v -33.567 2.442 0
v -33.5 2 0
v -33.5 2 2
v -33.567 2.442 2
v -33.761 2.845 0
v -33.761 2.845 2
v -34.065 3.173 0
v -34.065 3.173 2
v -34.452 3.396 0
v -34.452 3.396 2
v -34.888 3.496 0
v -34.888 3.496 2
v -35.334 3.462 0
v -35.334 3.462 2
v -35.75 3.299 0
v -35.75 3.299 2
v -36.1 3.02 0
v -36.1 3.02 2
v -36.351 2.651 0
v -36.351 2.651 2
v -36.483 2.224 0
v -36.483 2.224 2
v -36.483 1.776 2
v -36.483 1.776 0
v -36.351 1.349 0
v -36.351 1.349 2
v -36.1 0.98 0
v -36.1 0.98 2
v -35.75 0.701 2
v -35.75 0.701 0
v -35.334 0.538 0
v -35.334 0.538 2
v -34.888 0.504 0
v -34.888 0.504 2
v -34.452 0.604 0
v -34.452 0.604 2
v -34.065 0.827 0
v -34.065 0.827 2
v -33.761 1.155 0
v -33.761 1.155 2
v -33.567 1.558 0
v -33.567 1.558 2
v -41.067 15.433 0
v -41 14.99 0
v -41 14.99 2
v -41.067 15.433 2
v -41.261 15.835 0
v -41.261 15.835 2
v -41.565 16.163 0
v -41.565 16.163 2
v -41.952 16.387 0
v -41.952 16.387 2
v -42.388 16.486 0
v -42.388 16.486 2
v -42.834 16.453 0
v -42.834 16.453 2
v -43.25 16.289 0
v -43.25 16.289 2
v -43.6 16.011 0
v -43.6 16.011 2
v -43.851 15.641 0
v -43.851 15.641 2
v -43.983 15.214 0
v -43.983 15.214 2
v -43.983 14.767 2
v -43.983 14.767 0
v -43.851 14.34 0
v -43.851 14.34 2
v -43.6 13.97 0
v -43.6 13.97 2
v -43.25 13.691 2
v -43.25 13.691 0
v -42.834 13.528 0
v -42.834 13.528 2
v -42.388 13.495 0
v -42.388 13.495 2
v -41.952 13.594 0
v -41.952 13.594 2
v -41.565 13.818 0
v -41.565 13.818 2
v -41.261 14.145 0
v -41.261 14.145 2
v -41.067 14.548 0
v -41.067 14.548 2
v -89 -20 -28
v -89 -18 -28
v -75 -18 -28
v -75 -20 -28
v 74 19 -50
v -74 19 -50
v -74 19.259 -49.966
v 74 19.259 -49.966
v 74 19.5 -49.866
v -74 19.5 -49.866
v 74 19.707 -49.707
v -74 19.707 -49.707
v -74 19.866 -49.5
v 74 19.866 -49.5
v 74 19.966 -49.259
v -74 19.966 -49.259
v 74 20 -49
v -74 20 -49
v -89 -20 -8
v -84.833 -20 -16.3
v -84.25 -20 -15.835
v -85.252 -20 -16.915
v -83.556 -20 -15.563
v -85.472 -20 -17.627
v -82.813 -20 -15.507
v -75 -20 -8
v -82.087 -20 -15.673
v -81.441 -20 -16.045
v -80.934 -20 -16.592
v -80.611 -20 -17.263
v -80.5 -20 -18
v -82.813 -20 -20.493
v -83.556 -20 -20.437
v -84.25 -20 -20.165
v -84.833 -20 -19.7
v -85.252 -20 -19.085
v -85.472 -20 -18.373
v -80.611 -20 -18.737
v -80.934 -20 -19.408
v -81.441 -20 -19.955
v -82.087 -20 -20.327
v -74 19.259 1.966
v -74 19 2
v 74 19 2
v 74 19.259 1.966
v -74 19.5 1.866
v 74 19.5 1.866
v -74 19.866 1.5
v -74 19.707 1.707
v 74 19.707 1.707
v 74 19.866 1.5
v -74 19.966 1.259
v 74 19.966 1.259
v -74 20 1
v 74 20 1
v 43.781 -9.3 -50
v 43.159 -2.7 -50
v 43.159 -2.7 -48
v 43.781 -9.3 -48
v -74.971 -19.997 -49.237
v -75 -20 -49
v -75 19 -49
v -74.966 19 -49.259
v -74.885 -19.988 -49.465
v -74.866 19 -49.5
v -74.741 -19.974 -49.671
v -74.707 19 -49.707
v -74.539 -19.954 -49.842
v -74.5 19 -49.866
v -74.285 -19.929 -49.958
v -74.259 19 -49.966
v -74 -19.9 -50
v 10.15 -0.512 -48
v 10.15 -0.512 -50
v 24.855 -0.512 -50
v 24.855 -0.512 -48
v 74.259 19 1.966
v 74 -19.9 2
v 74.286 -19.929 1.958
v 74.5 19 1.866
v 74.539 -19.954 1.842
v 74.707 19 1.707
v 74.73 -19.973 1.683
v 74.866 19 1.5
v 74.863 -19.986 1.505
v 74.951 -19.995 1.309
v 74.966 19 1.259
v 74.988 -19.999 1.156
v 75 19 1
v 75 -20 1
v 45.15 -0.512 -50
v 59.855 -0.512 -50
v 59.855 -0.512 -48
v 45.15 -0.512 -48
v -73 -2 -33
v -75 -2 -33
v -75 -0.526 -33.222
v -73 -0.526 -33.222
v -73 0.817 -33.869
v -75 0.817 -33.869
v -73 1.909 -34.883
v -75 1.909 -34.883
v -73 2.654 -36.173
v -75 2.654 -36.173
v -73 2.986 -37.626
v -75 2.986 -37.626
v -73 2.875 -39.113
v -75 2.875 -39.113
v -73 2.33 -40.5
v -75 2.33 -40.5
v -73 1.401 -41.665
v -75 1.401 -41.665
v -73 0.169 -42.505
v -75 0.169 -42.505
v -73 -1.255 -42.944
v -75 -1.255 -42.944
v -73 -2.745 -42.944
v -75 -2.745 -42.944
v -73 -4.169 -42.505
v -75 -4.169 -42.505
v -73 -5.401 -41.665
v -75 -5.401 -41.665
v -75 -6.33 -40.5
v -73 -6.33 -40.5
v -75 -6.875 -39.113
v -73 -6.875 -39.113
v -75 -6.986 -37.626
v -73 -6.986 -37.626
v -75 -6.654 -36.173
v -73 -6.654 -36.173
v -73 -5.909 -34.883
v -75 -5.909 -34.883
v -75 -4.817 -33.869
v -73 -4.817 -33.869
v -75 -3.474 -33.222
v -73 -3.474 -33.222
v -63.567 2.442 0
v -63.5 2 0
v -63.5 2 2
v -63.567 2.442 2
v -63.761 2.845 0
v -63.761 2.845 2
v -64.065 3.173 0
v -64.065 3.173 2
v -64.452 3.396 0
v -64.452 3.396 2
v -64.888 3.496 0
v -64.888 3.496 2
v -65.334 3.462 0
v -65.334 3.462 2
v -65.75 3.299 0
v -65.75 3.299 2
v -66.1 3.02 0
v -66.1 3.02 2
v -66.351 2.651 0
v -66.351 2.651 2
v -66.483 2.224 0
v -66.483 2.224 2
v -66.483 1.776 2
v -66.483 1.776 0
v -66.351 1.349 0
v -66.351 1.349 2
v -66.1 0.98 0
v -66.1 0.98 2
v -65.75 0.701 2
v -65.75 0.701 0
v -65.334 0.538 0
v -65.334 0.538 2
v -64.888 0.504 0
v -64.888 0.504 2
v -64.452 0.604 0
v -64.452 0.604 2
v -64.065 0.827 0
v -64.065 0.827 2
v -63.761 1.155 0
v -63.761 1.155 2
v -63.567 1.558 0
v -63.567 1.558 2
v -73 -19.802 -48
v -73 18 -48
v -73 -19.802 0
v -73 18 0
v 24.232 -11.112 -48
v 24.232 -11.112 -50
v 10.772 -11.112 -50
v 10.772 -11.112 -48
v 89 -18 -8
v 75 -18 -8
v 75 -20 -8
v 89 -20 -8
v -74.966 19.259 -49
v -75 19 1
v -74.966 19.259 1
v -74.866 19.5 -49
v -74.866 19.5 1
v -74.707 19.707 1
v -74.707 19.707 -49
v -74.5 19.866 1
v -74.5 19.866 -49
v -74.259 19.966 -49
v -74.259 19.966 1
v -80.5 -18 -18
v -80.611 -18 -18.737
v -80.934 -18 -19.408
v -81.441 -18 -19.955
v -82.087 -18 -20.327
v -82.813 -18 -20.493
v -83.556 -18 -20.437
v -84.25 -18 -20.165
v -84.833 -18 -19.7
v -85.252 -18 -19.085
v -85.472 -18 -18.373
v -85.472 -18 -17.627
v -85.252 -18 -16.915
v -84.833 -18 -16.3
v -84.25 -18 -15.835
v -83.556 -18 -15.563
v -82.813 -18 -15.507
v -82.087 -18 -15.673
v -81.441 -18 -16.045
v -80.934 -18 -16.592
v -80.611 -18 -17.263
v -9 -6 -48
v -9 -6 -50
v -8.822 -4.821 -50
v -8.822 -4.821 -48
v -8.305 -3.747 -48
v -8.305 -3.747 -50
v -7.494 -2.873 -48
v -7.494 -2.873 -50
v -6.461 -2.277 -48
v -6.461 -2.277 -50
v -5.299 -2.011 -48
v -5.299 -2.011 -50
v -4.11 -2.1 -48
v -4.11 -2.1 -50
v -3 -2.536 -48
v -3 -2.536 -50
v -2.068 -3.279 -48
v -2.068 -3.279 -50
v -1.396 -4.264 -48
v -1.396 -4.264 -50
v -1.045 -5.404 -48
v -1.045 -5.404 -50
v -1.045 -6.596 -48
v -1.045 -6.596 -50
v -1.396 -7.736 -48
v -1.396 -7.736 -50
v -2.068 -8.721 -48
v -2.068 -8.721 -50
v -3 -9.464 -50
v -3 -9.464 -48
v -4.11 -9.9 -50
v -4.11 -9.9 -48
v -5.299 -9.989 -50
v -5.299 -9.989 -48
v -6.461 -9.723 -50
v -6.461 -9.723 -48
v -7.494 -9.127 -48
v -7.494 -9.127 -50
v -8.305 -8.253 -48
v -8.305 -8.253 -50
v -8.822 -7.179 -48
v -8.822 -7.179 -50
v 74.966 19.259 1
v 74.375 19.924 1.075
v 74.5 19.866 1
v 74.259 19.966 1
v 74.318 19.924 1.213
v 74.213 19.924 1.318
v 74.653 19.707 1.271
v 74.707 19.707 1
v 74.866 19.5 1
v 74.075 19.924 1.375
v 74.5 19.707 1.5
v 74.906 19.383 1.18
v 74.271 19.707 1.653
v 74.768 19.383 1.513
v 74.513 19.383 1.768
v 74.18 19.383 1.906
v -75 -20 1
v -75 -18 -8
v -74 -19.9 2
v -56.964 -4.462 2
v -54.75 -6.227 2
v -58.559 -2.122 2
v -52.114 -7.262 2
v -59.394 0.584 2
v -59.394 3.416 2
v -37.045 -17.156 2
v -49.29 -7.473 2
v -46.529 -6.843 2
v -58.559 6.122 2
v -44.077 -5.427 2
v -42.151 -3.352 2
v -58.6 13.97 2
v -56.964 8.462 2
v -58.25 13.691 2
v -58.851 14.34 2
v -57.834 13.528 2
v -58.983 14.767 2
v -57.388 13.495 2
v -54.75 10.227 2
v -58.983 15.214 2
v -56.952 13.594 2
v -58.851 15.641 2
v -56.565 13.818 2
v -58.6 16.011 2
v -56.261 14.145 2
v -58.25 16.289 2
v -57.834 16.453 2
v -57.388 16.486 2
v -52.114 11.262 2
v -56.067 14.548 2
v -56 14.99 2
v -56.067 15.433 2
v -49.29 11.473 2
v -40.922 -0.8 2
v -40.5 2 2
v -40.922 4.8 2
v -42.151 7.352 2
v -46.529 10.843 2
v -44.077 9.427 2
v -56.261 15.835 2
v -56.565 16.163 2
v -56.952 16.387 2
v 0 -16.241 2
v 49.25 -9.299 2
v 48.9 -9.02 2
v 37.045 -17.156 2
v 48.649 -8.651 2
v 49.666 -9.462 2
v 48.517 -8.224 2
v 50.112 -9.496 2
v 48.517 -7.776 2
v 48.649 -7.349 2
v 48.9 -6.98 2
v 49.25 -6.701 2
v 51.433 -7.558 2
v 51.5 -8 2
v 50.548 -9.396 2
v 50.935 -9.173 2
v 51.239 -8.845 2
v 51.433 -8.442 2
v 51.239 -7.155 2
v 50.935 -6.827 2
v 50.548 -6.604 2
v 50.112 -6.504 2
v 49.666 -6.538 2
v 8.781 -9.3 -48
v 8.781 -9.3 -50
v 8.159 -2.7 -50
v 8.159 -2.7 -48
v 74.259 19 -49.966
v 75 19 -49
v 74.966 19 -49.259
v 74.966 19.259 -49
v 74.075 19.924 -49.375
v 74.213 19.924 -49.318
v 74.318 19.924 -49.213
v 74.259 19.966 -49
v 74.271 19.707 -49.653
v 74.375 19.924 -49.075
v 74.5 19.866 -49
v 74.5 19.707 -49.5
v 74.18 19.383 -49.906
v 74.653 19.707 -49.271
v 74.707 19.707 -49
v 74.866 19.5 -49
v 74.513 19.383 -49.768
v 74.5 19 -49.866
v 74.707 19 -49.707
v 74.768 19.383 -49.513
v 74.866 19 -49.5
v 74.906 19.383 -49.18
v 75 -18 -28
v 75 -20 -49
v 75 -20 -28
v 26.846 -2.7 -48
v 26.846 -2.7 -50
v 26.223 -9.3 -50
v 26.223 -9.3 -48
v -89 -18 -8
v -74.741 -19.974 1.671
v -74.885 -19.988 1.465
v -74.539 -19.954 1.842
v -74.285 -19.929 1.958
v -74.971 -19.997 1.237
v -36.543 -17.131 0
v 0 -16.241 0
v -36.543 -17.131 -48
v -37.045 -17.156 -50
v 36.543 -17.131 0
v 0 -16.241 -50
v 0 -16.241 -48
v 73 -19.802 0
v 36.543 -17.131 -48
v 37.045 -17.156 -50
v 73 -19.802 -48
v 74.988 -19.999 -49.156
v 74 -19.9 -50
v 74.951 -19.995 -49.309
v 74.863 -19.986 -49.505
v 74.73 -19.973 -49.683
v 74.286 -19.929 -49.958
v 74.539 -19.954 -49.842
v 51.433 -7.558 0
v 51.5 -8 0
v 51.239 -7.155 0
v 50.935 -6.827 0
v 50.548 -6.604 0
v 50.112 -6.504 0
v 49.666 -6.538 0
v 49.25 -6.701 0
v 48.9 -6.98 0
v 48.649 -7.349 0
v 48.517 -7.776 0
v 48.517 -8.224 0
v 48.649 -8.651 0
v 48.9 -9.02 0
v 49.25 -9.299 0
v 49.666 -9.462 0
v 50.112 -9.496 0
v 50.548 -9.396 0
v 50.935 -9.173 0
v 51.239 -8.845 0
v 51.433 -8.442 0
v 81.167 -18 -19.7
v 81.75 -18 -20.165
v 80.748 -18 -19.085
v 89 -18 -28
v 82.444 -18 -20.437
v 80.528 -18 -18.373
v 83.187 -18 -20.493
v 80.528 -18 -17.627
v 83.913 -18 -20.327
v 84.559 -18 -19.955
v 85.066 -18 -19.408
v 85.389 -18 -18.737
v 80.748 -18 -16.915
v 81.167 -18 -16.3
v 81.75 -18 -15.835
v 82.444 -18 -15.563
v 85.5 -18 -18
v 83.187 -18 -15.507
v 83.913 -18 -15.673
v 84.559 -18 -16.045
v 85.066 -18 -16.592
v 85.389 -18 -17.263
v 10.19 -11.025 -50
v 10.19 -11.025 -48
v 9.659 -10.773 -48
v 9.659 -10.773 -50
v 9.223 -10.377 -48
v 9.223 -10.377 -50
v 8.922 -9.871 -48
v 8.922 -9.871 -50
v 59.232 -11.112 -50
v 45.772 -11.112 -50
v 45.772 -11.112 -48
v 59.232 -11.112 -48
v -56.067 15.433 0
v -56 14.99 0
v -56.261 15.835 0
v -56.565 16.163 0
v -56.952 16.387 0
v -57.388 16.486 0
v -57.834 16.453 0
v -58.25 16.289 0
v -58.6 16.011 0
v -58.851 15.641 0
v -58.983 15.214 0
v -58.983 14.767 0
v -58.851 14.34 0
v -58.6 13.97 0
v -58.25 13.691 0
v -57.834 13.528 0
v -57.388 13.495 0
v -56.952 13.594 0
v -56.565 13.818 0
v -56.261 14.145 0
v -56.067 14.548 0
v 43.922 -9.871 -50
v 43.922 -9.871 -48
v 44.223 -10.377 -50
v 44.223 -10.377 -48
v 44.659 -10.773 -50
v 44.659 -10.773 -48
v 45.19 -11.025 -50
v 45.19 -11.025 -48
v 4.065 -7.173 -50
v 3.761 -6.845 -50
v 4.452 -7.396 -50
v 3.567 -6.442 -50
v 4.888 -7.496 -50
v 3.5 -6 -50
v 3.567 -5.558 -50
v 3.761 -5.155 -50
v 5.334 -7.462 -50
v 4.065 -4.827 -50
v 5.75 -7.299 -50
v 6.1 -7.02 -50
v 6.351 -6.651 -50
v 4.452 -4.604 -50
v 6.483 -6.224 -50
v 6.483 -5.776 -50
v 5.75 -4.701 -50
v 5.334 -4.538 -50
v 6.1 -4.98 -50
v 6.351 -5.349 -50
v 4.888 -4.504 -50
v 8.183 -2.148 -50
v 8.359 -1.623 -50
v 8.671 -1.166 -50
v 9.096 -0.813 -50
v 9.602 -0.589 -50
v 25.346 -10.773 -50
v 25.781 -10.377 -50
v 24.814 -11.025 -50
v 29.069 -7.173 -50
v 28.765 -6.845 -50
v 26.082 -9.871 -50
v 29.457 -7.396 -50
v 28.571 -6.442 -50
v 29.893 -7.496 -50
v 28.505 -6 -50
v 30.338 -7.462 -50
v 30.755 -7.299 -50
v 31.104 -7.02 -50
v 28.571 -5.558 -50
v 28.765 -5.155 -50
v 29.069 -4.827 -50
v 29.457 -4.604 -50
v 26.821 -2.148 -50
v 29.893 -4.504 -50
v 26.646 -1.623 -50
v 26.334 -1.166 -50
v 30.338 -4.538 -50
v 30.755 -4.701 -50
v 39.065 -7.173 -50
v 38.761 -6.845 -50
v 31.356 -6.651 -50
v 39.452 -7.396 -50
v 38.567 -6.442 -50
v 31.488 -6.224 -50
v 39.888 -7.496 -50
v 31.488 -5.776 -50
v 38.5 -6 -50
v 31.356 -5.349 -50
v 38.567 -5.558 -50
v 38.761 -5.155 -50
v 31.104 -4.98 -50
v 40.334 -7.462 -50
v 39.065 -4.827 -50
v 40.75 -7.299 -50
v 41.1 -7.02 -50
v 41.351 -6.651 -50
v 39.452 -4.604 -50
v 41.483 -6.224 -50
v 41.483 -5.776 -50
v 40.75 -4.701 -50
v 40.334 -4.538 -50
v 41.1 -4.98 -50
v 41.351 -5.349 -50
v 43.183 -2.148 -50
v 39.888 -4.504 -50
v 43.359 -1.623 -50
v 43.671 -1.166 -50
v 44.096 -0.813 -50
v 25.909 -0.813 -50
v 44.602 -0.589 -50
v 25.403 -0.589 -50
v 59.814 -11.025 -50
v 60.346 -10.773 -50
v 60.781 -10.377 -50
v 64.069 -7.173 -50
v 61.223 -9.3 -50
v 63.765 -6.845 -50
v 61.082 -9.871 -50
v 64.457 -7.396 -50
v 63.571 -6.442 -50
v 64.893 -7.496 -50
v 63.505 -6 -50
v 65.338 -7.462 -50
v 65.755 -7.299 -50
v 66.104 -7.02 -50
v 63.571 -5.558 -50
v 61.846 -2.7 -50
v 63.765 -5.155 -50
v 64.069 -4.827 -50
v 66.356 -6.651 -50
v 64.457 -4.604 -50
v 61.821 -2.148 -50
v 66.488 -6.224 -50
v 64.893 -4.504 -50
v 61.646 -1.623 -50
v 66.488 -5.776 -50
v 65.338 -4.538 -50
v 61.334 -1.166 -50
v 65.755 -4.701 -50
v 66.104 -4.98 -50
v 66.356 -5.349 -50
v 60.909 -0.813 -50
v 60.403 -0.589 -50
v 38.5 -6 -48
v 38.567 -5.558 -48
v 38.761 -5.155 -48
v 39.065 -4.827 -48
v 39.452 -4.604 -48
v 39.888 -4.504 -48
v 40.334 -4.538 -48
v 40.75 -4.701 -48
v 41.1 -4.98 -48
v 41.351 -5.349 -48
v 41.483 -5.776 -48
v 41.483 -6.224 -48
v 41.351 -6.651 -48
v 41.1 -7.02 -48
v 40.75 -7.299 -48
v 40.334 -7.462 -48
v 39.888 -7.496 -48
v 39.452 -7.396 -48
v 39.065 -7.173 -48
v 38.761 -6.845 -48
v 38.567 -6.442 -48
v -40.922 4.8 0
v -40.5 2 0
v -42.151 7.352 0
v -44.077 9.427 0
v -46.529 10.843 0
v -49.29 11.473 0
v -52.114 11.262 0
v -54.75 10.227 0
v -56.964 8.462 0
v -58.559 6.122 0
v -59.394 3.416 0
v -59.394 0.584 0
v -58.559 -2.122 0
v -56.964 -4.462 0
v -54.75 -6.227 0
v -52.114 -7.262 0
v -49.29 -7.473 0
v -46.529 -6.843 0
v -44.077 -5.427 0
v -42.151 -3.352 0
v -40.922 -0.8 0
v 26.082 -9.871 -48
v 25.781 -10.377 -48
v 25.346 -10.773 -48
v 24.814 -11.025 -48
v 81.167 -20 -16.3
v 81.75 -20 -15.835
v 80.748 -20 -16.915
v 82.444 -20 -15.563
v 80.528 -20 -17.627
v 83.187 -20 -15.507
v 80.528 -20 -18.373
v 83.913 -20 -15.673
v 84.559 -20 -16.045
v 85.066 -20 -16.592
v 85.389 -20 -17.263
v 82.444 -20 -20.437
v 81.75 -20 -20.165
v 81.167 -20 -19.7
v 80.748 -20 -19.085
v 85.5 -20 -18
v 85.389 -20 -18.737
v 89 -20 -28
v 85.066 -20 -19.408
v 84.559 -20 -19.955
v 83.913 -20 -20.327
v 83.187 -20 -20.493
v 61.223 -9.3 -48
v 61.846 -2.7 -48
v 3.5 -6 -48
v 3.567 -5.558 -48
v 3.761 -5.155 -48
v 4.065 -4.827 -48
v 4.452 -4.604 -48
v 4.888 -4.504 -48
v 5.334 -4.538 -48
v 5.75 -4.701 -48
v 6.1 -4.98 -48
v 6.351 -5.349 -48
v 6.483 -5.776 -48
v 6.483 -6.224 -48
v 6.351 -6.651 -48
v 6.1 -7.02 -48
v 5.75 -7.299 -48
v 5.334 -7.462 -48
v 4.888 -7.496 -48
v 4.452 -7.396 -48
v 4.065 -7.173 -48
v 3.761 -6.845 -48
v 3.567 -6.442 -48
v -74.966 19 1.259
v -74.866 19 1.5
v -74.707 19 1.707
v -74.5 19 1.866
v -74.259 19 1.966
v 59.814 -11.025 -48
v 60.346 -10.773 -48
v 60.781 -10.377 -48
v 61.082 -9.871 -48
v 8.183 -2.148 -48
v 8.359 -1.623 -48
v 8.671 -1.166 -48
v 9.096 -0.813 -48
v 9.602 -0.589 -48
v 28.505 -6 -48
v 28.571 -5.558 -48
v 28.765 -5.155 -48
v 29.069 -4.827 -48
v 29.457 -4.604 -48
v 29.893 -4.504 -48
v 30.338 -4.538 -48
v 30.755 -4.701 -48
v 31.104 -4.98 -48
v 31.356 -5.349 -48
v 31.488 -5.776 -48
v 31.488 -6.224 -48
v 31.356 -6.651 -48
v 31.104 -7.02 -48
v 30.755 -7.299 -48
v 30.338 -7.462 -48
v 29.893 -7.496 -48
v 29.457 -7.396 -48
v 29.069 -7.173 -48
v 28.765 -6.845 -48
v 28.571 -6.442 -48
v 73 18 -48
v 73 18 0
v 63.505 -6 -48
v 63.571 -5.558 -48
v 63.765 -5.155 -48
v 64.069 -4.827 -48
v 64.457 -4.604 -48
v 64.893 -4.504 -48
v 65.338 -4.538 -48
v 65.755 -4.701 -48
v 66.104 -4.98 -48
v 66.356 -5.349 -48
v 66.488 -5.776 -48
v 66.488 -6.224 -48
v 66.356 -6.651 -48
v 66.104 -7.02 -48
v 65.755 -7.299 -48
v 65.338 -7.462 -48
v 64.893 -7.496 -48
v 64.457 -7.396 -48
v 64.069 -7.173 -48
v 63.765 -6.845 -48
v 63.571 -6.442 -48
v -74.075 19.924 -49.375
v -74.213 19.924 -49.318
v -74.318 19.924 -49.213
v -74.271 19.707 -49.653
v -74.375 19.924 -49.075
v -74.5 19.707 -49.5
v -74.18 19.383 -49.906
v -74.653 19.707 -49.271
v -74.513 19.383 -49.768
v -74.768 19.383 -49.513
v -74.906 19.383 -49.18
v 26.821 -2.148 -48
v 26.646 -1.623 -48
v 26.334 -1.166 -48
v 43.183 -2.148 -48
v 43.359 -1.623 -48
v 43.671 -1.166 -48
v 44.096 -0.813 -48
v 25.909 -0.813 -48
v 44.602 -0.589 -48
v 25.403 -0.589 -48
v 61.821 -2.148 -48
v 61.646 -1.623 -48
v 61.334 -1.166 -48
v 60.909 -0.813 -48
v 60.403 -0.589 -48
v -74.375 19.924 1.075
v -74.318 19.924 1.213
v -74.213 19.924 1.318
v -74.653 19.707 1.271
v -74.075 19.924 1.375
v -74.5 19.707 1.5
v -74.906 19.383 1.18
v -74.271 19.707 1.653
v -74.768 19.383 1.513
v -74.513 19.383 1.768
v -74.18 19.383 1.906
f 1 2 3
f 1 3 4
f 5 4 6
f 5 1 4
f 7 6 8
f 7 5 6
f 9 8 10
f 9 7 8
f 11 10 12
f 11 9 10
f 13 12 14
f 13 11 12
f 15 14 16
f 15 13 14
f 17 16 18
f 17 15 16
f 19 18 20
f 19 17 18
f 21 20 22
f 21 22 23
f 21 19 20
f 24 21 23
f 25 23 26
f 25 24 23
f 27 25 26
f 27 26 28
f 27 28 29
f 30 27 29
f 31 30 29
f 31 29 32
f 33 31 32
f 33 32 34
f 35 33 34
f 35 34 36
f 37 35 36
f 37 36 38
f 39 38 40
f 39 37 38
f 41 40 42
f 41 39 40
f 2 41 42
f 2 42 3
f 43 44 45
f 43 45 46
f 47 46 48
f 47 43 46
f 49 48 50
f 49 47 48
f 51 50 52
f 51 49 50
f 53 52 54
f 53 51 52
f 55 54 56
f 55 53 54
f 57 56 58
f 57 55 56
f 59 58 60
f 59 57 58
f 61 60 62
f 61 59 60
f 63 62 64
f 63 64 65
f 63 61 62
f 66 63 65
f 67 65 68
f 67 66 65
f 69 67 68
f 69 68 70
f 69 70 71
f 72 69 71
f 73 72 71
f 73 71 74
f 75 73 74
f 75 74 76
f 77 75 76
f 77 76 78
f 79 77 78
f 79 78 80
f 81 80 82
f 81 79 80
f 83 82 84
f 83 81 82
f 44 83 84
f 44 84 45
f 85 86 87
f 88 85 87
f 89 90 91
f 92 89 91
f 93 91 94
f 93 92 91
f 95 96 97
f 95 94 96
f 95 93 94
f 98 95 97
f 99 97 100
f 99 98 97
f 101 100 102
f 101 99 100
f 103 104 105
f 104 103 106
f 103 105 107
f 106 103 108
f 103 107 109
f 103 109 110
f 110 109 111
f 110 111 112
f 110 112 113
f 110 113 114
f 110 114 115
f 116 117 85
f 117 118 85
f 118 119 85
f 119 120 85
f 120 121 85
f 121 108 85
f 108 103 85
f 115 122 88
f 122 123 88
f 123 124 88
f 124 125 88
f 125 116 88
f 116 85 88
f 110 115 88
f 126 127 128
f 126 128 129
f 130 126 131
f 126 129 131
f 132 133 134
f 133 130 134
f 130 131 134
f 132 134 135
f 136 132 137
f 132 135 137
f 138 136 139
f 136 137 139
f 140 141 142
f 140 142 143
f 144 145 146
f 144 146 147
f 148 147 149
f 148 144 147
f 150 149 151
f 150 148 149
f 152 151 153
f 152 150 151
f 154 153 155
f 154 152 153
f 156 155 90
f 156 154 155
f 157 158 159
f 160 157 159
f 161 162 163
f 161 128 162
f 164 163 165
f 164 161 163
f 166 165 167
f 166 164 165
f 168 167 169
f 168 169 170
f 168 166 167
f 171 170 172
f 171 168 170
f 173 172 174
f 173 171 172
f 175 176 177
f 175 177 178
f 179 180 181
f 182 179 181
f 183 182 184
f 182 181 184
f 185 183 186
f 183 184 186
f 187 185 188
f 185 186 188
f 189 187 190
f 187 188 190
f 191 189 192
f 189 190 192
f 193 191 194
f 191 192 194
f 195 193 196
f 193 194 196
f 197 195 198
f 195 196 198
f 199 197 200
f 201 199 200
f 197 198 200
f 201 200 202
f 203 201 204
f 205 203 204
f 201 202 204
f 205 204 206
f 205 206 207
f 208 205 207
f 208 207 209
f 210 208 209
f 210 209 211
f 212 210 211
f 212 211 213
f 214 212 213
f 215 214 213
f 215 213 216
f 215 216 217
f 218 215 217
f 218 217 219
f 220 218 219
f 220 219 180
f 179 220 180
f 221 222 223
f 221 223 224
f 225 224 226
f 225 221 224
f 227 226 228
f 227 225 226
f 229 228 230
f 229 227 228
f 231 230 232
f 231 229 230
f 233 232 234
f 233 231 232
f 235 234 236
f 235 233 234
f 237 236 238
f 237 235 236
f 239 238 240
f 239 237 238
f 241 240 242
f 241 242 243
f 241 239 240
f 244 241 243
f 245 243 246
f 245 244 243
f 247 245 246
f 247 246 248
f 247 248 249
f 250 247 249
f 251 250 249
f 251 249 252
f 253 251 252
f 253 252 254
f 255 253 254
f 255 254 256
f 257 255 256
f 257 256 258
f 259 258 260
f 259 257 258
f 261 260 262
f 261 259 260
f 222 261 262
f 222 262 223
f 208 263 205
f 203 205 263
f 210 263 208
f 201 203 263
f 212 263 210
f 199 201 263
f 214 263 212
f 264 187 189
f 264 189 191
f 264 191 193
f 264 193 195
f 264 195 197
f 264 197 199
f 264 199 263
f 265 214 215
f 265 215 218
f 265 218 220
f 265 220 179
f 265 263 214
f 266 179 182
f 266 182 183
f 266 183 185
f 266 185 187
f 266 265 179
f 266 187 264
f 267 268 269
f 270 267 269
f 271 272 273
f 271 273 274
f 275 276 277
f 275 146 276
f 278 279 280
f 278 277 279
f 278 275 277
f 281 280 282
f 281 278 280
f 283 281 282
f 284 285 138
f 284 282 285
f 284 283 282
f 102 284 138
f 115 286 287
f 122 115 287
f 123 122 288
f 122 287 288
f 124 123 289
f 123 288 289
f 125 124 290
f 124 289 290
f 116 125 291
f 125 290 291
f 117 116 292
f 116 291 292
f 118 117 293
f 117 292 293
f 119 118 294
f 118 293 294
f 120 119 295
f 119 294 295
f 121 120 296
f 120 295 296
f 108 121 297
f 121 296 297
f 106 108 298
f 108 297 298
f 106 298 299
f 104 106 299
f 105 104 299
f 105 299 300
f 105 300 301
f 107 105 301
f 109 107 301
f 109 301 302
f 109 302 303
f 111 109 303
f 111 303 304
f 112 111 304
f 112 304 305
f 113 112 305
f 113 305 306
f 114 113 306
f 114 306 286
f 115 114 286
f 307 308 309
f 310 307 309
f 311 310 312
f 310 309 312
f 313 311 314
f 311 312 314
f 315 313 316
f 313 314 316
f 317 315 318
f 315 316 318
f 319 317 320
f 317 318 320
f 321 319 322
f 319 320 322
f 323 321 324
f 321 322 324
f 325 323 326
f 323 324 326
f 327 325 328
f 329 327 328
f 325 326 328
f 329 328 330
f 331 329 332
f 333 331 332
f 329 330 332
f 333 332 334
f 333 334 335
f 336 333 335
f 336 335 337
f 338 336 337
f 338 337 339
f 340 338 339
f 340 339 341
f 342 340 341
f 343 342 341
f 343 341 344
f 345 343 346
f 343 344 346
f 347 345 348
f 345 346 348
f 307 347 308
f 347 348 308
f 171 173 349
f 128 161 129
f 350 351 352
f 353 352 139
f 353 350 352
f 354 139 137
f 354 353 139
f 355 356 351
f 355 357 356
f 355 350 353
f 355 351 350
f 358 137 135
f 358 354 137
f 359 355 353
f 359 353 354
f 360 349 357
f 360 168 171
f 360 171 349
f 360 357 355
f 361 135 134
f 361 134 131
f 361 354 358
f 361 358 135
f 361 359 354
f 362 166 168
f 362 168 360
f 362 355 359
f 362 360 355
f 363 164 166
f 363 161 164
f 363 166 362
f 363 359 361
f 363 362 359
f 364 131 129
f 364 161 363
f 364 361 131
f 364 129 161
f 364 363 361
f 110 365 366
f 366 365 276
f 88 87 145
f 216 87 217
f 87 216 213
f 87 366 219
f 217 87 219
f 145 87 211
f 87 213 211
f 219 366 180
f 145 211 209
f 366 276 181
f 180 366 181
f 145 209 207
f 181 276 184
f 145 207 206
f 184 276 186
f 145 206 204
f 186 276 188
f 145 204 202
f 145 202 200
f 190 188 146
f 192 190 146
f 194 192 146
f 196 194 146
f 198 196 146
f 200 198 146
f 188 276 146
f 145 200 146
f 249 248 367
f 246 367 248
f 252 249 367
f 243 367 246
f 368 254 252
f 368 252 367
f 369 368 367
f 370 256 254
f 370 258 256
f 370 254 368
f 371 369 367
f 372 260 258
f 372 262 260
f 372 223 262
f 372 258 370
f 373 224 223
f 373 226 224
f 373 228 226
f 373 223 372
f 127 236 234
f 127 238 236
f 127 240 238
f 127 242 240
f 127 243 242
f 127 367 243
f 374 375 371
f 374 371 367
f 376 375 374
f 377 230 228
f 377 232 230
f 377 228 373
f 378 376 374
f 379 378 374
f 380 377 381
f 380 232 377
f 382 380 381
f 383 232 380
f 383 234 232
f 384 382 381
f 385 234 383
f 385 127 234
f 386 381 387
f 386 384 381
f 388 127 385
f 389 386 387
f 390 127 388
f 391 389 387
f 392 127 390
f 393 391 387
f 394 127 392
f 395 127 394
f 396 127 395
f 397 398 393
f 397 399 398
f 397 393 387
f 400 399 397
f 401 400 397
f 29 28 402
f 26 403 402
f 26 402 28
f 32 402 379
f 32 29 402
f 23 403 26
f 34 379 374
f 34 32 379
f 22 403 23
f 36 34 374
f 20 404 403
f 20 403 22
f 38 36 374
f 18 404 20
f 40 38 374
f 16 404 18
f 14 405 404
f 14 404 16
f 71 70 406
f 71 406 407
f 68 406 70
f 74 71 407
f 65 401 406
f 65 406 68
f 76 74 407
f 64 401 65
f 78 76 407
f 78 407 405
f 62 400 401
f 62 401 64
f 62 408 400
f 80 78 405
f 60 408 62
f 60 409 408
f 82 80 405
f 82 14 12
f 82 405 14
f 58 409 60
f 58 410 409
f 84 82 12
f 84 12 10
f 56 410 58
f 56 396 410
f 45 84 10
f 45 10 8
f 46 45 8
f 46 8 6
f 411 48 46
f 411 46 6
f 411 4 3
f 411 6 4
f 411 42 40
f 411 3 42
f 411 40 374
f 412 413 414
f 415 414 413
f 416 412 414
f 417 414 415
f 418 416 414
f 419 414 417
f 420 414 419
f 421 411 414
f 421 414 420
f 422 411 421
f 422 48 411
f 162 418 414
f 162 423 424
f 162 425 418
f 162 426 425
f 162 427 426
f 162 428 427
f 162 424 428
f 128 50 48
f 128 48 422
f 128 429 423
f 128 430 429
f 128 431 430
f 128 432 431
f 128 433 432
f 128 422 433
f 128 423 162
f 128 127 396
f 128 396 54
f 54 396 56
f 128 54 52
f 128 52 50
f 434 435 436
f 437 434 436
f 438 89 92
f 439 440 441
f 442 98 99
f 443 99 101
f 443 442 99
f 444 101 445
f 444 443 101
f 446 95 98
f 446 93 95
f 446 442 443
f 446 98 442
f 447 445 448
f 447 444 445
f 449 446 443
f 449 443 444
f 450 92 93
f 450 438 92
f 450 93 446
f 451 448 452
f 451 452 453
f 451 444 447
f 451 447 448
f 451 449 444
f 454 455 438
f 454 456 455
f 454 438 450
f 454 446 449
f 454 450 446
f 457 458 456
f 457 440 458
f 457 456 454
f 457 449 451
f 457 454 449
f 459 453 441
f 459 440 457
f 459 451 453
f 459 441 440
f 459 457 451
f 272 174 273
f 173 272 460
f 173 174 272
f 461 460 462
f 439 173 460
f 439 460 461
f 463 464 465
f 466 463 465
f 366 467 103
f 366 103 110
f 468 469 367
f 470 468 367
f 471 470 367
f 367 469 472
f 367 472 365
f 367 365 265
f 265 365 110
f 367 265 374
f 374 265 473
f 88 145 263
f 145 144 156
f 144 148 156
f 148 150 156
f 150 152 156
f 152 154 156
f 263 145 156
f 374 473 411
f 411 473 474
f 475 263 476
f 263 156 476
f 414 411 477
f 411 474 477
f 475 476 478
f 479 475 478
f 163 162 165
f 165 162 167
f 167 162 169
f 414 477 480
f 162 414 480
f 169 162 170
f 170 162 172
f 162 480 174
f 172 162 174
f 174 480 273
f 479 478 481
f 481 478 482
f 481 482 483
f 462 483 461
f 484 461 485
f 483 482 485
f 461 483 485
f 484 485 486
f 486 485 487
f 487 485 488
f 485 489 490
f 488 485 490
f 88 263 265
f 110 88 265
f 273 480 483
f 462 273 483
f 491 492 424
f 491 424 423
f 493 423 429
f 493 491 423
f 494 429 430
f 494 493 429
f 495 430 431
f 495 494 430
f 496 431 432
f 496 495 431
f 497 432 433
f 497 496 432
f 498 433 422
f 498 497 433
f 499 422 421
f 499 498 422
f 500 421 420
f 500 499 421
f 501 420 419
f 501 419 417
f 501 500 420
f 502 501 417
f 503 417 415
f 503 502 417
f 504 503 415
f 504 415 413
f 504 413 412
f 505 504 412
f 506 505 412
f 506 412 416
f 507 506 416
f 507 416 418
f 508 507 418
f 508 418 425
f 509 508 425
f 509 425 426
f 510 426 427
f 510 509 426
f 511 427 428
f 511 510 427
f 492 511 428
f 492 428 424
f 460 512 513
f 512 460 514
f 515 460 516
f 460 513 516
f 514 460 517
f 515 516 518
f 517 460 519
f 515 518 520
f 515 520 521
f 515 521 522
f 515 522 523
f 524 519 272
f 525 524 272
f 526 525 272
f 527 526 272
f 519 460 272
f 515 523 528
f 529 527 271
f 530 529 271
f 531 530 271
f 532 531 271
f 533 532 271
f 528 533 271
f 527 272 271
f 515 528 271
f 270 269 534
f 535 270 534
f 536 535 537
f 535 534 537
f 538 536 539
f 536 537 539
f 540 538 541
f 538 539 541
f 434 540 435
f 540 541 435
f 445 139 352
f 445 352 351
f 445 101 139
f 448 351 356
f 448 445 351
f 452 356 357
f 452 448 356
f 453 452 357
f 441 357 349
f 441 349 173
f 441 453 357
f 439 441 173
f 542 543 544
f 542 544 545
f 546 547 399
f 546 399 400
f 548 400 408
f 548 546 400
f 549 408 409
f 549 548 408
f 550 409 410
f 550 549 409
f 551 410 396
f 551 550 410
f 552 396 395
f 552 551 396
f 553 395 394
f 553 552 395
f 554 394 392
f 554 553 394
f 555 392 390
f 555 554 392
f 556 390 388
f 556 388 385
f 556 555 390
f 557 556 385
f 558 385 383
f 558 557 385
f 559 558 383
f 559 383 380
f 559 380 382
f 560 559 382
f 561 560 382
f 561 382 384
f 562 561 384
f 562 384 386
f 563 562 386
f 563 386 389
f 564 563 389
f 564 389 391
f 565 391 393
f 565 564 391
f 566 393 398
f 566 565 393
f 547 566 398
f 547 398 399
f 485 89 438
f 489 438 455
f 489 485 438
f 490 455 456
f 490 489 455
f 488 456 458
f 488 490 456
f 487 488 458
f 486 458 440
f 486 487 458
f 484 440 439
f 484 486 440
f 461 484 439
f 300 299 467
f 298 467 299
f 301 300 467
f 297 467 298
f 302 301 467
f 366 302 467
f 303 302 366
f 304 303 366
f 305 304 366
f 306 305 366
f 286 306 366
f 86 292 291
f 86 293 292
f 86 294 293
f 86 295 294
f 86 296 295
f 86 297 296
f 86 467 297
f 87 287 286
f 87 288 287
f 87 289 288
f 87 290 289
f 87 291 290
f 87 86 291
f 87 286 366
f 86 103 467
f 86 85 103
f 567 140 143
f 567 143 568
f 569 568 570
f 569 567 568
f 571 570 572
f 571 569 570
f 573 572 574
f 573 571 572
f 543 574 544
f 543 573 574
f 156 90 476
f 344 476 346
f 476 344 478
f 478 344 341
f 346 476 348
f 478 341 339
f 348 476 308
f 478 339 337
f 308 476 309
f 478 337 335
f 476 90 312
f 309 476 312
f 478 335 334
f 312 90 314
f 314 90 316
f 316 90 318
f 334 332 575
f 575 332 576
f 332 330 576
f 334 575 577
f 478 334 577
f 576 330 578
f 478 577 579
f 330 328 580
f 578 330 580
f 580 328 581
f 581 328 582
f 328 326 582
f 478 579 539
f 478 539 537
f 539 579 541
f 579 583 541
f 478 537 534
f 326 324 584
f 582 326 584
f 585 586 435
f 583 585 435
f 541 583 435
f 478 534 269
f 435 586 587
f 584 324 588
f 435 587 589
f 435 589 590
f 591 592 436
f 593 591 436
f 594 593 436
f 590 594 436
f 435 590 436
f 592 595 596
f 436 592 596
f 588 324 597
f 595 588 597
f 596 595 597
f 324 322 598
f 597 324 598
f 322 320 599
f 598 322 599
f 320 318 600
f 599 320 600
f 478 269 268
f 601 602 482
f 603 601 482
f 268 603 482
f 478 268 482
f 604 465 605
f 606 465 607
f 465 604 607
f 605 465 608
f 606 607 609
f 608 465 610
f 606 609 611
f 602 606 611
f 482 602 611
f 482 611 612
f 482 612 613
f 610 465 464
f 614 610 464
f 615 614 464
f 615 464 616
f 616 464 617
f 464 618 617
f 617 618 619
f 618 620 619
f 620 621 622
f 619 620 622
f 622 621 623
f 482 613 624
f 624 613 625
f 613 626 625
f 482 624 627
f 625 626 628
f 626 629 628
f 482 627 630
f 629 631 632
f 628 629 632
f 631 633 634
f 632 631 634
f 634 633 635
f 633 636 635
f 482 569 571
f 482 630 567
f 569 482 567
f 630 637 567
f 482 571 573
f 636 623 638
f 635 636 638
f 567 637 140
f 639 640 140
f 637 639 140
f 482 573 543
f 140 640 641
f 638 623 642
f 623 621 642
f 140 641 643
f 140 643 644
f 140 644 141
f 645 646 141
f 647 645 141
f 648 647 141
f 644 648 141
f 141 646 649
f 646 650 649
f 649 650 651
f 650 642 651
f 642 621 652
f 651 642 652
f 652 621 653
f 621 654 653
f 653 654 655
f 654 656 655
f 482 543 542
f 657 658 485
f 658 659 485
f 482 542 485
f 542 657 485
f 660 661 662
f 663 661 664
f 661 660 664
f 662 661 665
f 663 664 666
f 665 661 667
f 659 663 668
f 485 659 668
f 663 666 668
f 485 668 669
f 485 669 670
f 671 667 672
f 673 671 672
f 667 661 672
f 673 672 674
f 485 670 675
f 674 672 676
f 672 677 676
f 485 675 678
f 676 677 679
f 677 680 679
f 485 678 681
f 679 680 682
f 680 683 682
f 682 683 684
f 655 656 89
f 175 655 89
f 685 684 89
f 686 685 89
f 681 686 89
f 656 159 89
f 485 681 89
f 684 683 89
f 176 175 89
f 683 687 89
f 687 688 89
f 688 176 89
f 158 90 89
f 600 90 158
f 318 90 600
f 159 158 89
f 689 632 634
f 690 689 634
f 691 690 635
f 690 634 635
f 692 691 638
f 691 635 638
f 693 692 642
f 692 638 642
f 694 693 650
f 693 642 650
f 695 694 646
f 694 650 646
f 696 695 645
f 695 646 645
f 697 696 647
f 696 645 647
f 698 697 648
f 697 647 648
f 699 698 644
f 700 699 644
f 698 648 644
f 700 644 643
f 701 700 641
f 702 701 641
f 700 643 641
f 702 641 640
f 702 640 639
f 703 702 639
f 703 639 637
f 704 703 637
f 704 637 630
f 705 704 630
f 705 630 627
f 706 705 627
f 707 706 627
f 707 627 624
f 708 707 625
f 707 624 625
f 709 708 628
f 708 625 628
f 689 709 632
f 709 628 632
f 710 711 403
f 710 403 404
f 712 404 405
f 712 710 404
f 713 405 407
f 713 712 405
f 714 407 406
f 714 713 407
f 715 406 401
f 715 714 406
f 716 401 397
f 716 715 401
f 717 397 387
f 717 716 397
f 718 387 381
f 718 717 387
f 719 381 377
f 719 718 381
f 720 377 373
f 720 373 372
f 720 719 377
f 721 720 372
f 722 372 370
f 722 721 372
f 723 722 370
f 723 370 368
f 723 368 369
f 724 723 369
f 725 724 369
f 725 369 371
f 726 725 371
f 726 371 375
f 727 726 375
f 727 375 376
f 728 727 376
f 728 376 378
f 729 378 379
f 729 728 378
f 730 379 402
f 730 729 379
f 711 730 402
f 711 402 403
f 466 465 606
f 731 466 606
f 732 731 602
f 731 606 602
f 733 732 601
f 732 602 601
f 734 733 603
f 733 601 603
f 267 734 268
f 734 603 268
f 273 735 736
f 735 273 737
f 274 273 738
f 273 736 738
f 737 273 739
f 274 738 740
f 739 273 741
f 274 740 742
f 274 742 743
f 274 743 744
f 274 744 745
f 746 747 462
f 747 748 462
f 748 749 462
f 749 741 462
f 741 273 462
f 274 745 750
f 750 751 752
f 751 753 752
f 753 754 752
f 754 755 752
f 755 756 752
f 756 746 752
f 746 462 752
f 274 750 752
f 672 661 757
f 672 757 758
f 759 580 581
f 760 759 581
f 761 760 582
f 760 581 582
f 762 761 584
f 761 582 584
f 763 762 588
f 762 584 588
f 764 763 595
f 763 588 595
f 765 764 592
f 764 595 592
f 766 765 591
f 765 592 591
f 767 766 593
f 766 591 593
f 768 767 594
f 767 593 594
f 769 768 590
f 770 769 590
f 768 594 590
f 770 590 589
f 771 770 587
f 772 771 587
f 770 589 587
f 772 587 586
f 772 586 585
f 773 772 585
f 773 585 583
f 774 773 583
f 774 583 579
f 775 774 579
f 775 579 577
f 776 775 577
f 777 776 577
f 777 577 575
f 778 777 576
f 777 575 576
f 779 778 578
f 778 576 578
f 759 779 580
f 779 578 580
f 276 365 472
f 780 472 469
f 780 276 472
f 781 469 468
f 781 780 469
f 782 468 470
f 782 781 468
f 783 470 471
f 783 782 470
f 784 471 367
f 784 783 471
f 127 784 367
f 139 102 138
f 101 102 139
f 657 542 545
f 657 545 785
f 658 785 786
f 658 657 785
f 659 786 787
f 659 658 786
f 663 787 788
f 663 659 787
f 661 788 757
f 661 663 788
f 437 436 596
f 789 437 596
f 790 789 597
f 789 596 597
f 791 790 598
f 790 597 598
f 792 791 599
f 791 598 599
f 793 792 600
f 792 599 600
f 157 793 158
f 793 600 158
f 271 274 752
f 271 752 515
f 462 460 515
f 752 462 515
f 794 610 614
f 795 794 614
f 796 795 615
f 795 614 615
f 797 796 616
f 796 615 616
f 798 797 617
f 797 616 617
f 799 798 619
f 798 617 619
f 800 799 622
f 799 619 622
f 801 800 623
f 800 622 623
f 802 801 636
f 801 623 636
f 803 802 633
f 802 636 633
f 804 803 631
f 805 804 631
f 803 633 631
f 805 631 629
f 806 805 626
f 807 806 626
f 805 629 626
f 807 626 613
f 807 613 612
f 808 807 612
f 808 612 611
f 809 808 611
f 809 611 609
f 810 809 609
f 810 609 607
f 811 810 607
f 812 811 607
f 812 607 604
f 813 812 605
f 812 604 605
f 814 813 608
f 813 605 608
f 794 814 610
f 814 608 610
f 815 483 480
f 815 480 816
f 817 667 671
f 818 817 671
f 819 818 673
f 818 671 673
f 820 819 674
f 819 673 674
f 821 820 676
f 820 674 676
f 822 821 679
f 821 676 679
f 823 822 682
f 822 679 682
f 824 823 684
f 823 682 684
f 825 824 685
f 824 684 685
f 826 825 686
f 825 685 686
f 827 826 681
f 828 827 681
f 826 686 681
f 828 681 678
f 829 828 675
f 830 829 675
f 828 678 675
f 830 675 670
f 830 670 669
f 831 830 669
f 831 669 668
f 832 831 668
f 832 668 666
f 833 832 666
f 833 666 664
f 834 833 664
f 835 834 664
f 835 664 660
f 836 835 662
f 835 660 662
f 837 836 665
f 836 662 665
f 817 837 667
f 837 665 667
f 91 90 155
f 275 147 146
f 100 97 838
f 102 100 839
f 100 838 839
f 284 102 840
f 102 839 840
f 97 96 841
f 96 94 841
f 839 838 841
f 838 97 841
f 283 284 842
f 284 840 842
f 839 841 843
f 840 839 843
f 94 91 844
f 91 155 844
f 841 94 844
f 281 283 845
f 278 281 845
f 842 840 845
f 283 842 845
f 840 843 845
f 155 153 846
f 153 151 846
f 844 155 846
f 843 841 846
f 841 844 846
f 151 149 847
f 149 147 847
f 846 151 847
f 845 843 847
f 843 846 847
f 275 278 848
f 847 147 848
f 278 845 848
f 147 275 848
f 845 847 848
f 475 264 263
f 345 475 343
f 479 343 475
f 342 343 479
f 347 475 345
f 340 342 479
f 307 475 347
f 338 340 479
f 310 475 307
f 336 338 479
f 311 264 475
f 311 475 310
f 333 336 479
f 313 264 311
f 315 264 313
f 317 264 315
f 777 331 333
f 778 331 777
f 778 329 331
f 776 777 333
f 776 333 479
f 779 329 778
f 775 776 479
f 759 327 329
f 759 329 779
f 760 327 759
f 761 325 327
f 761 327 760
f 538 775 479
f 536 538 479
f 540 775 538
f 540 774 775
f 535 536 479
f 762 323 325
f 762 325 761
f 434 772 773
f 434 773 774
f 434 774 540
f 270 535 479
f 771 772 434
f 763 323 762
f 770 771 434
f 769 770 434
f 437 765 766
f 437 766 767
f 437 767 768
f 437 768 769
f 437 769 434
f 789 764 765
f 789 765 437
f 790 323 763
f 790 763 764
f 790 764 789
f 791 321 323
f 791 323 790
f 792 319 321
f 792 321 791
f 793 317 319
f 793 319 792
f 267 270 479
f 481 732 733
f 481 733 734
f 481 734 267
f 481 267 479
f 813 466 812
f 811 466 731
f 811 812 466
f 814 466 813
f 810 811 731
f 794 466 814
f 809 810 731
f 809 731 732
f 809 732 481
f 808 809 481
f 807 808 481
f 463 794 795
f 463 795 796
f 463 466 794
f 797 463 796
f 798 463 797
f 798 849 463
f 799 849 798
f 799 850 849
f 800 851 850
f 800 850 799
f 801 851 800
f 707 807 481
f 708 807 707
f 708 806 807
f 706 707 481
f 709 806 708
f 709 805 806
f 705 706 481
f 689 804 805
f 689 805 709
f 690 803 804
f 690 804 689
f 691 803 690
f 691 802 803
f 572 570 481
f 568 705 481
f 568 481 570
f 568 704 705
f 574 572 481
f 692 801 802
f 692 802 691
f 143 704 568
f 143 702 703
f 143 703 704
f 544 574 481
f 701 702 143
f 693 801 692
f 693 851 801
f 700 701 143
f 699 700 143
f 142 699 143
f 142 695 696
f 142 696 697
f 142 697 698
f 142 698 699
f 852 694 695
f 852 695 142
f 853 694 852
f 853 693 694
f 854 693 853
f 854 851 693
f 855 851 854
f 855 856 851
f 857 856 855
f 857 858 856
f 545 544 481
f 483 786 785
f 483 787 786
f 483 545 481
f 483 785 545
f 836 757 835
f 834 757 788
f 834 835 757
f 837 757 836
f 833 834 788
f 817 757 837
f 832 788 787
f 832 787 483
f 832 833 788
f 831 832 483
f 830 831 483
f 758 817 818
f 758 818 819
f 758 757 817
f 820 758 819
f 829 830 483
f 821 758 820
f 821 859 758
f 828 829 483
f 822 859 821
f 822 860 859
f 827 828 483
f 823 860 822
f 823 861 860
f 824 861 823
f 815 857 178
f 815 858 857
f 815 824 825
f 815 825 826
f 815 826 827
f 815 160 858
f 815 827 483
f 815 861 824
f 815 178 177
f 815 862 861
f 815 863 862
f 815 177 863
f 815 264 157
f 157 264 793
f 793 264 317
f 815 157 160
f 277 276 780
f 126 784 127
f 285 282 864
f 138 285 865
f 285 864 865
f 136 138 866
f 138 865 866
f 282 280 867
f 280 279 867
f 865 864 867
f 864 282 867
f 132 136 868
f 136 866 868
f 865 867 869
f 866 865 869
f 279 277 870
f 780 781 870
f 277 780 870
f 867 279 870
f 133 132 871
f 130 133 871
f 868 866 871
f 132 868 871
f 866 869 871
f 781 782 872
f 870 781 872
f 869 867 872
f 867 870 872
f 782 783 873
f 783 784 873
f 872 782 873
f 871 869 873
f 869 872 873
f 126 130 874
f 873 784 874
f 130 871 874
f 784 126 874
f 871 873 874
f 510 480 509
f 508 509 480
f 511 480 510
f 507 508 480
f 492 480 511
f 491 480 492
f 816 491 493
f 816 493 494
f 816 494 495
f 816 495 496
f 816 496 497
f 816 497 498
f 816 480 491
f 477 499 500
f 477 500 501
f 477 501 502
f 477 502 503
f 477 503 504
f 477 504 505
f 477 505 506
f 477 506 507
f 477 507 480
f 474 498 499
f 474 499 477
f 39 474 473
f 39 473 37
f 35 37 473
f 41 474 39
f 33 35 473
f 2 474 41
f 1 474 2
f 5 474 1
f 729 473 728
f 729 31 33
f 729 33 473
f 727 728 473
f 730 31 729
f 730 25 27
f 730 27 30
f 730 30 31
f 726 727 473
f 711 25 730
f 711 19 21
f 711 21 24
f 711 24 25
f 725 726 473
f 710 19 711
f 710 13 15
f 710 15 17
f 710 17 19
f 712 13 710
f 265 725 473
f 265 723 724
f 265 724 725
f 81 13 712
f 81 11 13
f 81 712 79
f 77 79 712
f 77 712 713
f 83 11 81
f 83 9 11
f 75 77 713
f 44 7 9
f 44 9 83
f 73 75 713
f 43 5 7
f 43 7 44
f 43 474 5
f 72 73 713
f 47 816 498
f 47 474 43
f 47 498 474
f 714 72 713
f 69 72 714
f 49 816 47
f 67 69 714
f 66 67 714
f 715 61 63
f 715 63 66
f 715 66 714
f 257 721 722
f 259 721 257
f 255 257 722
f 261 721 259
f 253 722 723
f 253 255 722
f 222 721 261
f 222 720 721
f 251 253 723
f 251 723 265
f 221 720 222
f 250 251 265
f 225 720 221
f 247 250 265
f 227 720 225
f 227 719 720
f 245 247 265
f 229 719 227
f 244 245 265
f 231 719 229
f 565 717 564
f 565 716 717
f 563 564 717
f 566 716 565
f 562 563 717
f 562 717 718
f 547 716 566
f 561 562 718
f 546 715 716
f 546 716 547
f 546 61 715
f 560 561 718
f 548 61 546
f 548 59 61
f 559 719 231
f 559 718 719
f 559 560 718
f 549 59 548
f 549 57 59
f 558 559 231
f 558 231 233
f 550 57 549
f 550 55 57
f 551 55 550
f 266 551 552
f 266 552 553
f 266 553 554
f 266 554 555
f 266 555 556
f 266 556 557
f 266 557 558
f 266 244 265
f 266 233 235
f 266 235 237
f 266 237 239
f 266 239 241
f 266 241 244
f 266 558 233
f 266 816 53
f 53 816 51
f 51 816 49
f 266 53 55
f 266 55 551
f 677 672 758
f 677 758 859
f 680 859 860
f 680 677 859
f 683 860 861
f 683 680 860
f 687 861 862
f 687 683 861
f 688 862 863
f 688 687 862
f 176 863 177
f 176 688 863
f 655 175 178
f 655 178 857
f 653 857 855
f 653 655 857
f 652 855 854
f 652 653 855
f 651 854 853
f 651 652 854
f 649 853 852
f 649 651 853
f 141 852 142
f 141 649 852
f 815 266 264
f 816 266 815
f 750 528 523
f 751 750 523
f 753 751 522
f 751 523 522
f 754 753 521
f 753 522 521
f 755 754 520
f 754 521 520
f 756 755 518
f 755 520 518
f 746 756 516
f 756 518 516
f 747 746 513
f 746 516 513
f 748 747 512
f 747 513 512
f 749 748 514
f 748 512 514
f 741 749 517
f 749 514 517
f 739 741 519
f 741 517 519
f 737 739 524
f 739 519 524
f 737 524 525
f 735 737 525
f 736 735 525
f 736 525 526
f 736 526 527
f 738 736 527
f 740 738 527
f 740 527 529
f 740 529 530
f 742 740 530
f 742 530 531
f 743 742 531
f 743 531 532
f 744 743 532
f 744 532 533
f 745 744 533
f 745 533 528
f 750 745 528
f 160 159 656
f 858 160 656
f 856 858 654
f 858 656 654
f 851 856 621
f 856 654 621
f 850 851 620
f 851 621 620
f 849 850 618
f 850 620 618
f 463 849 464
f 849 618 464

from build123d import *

# Parameters (mm, degrees)
SKETCH1_W           = 150
SKETCH1_H           = 40
SKETCH1_R           = 9.5
SKETCH1_R_2         = 1.5
BOSS_EXTRUDE1_DEPTH = 2
SKETCH2_W           = 150
SKETCH2_H           = 40
SKETCH2_W_2         = 146
SKETCH2_H_2         = 36
BOSS_EXTRUDE3_DEPTH = 50
CUT_EXTRUDE1_REACH  = 152
SKETCH4_R           = 5
SKETCH8_W           = 146
SKETCH8_H           = 2
CUT_EXTRUDE4_DEPTH  = 48
SKETCH9_W           = 150
SKETCH9_H           = 2
BOSS_EXTRUDE4_DEPTH = 40
SKETCH10_W          = 14
SKETCH10_H          = 2
BOSS_EXTRUDE5_DEPTH = 10
SKETCH11_R          = 2.5
CUT_EXTRUDE5_DEPTH  = 41
SKETCH12_R          = 1.5
SKETCH12_R_2        = 4
CUT_EXTRUDE6_DEPTH  = 2
CUT_EXTRUDE7_DEPTH  = 60
FILLET1_R           = 1


with BuildPart() as part:
    # Sketch1 → Boss-Extrude1 (new body)
    with BuildSketch(Plane.XY):
        Rectangle(SKETCH1_W, SKETCH1_H)
        with Locations((-50, 2)):
            Circle(SKETCH1_R, mode=Mode.SUBTRACT)
        with Locations((-65, 2)):
            Circle(SKETCH1_R_2, mode=Mode.SUBTRACT)
        with Locations((-57.5, 14.990381057)):
            Circle(SKETCH1_R_2, mode=Mode.SUBTRACT)
        with Locations((-42.5, 14.990381057)):
            Circle(SKETCH1_R_2, mode=Mode.SUBTRACT)
        with Locations((-35, 2)):
            Circle(SKETCH1_R_2, mode=Mode.SUBTRACT)
        with Locations((50, -8)):
            Circle(SKETCH1_R_2, mode=Mode.SUBTRACT)
    extrude(amount=BOSS_EXTRUDE1_DEPTH)

    # Sketch2 → Boss-Extrude3 (add)
    with BuildSketch(Plane.XY.offset(2)):
        Rectangle(SKETCH2_W, SKETCH2_H)
        Rectangle(SKETCH2_W_2, SKETCH2_H_2, mode=Mode.SUBTRACT)
    extrude(amount=-BOSS_EXTRUDE3_DEPTH)

    # Sketch4 → Cut-Extrude1 (cut, up to next)
    with BuildSketch(Plane.ZY.offset(75), mode=Mode.PRIVATE) as cut_extrude1_sk1:
        with Locations((-38, -2)):
            Circle(SKETCH4_R)
    cut_extrude1_tool1 = extrude(cut_extrude1_sk1.sketch, amount=-CUT_EXTRUDE1_REACH, mode=Mode.PRIVATE) & part.part
    add(cut_extrude1_tool1.solids().sort_by_distance((-75, -2, -38))[0], mode=Mode.SUBTRACT)

    # Sketch8 → Cut-Extrude4 (cut)
    with BuildSketch(Plane(origin=(0, 0, -48), x_dir=(-1, 0, 0), z_dir=(0, 0, -1))):
        with Locations((0, -19)):
            Rectangle(SKETCH8_W, SKETCH8_H)
    extrude(amount=-CUT_EXTRUDE4_DEPTH, mode=Mode.SUBTRACT)

    # Sketch9 → Boss-Extrude4 (add)
    with BuildSketch(Plane(origin=(0, 20, 0), x_dir=(1, 0, 0), z_dir=(0, 1, 0))):
        with Locations((0, 49)):
            Rectangle(SKETCH9_W, SKETCH9_H)
    extrude(amount=-BOSS_EXTRUDE4_DEPTH)

    # Sketch10 → Boss-Extrude5 (add, symmetric)
    with BuildSketch(Plane.XY.offset(-18)):
        with Locations((-82, -19)):
            Rectangle(SKETCH10_W, SKETCH10_H)
        with Locations((82, -19)):
            Rectangle(SKETCH10_W, SKETCH10_H)
    extrude(amount=BOSS_EXTRUDE5_DEPTH, both=True)

    # Sketch11 → Cut-Extrude5 (cut, through all)
    with BuildSketch(Plane(origin=(0, 20, 0), x_dir=(1, 0, 0), z_dir=(0, 1, 0))):
        with Locations((-83, 18)):
            Circle(SKETCH11_R)
        with Locations((83, 18)):
            Circle(SKETCH11_R)
    extrude(amount=-CUT_EXTRUDE5_DEPTH, mode=Mode.SUBTRACT)

    # Sketch12 → Cut-Extrude6 (cut)
    with BuildSketch(Plane(origin=(0, 0, -50), x_dir=(-1, 0, 0), z_dir=(0, 0, -1))):
        with Locations((-65.004612411, -6)):
            Circle(SKETCH12_R)
        with Locations((-40, -6)):
            Circle(SKETCH12_R)
        with Locations((-5, -6)):
            Circle(SKETCH12_R)
        with Locations((-30.004612411, -6)):
            Circle(SKETCH12_R)
        with Locations((5, -6)):
            Circle(SKETCH12_R_2)
        with BuildLine():
            Line((-59.85474671, -0.512445776), (-45.1498657, -0.512445776))
            ThreePointArc((-45.1498657, -0.512445776), (-43.670729064, -1.166282781), (-43.158706695, -2.700290966))
            Line((-43.158706695, -2.700290966), (-43.781293305, -9.299709034))
            ThreePointArc((-43.781293305, -9.299709034), (-44.426289315, -10.591000482), (-45.772452311, -11.111863845))
            Line((-45.772452311, -11.111863845), (-59.2321601, -11.111863845))
            ThreePointArc((-59.2321601, -11.111863845), (-60.578323096, -10.591000482), (-61.223319106, -9.299709034))
            Line((-61.223319106, -9.299709034), (-61.845905716, -2.700290966))
            ThreePointArc((-61.845905716, -2.700290966), (-61.333883347, -1.166282781), (-59.85474671, -0.512445776))
        make_face()
        with BuildLine():
            Line((-26.845905716, -2.700290966), (-26.223319106, -9.299709034))
            ThreePointArc((-26.223319106, -9.299709034), (-25.578323096, -10.591000482), (-24.2321601, -11.111863845))
            Line((-24.2321601, -11.111863845), (-10.772452311, -11.111863845))
            ThreePointArc((-10.772452311, -11.111863845), (-9.426289315, -10.591000482), (-8.781293305, -9.299709034))
            Line((-8.781293305, -9.299709034), (-8.158706695, -2.700290966))
            ThreePointArc((-8.158706695, -2.700290966), (-8.670729064, -1.166282781), (-10.1498657, -0.512445776))
            Line((-10.1498657, -0.512445776), (-24.85474671, -0.512445776))
            ThreePointArc((-24.85474671, -0.512445776), (-26.333883347, -1.166282781), (-26.845905716, -2.700290966))
        make_face()
    extrude(amount=-CUT_EXTRUDE6_DEPTH, mode=Mode.SUBTRACT)

    # Sketch14 → Cut-Extrude7 (cut)
    with BuildSketch(Plane(origin=(0, 0, -50), x_dir=(-1, 0, 0), z_dir=(0, 0, -1))):
        with BuildLine():
            Line((-75, -20), (75, -20))
            ThreePointArc((75, -20), (0, -16.24057783), (-75, -20))
        make_face()
    extrude(amount=-CUT_EXTRUDE7_DEPTH, mode=Mode.SUBTRACT)

    # Fillet1
    fillet1_edges = [part.edges().sort_by_distance(p)[0] for p in [
        (-75, 0, -50),
        (75, 0, -50),
        (0, 20, -50),
        (-75, 0, 2),
        (75, 0, 2),
        (-75, 20, -24),
        (75, 20, -24),
        (0, 20, 2),
    ]]
    fillet(fillet1_edges, radius=FILLET1_R)


solid = part.part
